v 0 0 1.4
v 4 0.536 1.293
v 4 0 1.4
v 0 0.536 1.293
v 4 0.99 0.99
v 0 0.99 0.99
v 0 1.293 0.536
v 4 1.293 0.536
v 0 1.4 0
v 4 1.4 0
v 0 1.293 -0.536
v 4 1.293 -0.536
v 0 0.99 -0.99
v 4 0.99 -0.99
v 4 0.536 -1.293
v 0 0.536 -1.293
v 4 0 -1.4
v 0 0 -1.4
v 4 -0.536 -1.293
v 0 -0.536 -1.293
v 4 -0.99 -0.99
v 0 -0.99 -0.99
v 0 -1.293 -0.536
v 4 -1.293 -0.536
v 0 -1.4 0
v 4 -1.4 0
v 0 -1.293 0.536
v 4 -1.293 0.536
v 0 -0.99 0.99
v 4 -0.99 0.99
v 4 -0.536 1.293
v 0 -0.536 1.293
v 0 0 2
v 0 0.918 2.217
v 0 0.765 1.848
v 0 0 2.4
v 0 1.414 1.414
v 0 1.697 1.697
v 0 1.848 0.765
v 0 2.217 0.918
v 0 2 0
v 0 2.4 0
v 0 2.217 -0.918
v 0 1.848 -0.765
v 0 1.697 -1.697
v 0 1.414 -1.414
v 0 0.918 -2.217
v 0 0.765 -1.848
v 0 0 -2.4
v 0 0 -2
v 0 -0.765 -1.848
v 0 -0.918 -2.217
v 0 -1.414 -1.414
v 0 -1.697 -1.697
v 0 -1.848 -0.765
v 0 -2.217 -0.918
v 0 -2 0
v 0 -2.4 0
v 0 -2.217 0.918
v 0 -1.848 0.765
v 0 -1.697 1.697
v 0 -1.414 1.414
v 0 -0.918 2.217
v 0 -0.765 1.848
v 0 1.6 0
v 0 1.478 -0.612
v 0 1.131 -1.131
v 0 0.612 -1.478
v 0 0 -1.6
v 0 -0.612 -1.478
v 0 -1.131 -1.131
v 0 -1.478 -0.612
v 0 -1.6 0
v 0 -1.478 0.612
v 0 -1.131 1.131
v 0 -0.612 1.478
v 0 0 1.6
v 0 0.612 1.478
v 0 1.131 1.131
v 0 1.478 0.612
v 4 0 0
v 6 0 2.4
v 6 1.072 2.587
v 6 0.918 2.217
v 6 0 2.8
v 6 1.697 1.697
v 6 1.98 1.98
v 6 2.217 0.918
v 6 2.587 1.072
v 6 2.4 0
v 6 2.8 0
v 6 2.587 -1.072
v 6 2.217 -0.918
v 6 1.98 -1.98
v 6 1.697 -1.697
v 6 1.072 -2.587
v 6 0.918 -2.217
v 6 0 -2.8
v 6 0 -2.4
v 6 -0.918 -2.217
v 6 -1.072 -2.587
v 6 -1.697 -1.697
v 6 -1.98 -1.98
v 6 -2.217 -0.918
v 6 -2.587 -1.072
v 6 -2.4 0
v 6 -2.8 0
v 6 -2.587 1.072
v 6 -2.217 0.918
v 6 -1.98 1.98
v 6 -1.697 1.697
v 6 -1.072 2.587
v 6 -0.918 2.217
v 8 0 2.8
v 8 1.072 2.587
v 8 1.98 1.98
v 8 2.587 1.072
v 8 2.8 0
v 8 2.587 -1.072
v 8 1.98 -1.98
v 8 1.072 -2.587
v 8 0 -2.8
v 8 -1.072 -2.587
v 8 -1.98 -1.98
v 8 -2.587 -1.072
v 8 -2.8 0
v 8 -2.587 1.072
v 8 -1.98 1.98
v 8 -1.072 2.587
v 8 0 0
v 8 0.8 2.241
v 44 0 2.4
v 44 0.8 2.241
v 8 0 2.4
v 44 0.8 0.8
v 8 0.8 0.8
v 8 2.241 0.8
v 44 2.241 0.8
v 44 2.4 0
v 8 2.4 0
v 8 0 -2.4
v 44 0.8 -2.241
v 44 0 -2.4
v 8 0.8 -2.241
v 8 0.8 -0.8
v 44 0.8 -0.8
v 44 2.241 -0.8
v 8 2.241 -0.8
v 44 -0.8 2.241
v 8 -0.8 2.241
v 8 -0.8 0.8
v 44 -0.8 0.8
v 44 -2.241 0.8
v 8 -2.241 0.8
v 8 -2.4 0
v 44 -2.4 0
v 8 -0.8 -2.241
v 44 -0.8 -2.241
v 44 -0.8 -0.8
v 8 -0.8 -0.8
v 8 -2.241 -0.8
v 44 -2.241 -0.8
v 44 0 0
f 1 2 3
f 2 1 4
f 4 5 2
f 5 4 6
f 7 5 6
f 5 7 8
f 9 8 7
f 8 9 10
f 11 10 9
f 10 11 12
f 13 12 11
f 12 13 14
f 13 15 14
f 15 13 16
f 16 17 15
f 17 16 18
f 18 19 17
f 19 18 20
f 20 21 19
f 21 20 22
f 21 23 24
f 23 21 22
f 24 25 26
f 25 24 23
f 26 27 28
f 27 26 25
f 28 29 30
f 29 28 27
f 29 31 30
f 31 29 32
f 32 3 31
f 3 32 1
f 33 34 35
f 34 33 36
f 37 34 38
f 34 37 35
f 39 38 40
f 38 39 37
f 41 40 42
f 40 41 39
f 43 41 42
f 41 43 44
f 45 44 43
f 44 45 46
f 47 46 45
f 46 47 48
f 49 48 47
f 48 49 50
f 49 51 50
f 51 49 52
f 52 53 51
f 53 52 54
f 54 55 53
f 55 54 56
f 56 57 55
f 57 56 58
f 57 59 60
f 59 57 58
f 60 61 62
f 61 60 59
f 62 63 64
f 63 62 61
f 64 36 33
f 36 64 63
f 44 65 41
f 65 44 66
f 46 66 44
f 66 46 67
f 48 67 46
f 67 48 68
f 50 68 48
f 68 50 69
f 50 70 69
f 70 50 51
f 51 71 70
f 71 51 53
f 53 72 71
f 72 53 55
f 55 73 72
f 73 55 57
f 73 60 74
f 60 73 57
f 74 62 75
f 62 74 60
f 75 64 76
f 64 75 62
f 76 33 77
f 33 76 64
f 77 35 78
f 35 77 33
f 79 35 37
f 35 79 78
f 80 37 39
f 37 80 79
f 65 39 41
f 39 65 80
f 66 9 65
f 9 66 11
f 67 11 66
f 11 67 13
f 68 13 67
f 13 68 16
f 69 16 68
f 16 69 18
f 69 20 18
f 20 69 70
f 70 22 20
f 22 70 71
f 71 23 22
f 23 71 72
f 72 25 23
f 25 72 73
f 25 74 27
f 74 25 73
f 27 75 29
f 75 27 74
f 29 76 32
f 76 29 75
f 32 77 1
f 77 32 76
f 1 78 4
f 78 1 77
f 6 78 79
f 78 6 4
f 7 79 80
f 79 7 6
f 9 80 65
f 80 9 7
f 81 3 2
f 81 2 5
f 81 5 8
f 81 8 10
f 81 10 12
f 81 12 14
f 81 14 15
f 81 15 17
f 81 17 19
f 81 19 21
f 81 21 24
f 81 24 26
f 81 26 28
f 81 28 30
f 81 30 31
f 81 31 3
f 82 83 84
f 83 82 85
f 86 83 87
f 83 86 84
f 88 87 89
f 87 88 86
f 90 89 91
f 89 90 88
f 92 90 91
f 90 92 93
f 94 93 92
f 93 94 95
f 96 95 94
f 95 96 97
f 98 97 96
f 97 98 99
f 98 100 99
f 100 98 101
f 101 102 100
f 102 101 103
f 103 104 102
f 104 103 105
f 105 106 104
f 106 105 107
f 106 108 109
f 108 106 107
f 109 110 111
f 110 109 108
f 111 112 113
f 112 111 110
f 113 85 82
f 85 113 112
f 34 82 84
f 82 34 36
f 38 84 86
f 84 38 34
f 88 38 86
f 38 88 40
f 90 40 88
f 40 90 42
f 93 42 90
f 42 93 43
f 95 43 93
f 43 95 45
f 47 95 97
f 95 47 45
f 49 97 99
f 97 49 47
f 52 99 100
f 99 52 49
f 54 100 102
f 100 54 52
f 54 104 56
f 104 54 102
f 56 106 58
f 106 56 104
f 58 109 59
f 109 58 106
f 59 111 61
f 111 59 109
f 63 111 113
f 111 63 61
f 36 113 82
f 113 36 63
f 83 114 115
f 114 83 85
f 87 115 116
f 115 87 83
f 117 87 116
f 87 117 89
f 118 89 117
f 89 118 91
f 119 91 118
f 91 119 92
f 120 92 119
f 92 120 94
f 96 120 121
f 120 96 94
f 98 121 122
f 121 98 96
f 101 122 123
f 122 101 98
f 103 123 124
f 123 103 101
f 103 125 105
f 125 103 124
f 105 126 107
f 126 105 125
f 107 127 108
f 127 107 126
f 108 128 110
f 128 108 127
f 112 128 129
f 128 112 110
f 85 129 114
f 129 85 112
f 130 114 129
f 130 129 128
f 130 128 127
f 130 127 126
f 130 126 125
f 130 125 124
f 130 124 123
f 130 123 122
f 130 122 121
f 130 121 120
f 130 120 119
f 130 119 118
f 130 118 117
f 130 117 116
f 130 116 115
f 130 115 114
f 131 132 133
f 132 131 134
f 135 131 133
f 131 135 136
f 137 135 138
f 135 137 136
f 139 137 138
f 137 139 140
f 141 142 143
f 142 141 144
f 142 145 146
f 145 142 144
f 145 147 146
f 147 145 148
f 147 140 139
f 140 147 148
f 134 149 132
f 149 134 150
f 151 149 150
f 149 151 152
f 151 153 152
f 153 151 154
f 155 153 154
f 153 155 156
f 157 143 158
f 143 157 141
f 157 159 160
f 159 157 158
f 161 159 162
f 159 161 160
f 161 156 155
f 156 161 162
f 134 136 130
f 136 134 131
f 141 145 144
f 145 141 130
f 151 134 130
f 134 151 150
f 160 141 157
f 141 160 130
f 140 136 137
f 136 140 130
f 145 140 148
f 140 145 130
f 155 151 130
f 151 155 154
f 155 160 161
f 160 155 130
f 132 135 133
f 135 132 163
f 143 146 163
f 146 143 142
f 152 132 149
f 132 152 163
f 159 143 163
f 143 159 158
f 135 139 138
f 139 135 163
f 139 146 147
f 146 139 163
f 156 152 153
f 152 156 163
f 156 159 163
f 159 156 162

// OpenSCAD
// file: ../p/axle.scad
use <../lib.scad>
function ldraw_lib__axle() = [
// 0 Axle
// 0 Name: axle.dat
// 0 Author: James Jessiman
// 0 !LDRAW_ORG Primitive UPDATE 2003-01
// 0 !LICENSE Licensed under CC BY 2.0 and CC BY 4.0 : see CAreadme.txt
// 
// 0 BFC CERTIFY CCW
  [0,"BFC","CERTIFY"],
  [0,"BFC","CCW"],
// 
// 0 !HISTORY 2000-04-23 [sbliss] Added conditional edges along outermost diameters
// 0 !HISTORY 2000-05-07 [PTadmin] Official Update 2000-01
// 0 !HISTORY 2002-11-08 [OrionP] Adjusted fit and precision
// 0 !HISTORY 2003-03-12 [PTadmin] Official Update 2003-01
// 0 !HISTORY 2007-06-24 [PTadmin] Header formatted for Contributor Agreement
// 0 !HISTORY 2008-07-01 [PTadmin] Official Update 2008-01
// 
// 
// 5 24 6 0 0 6 1 0 5.602 0 2 5.602 0 -2
  [5,24,6,0,0,6,1,0,5.602,0,2,5.602,0,-2],
// 5 24 0 0 6 0 1 6 2 0 5.602 -2 0 5.602
  [5,24,0,0,6,0,1,6,2,0,5.602,-2,0,5.602],
// 5 24 -6 0 0 -6 1 0 -5.602 0 -2 -5.602 0 2
  [5,24,-6,0,0,-6,1,0,-5.602,0,-2,-5.602,0,2],
// 5 24 0 0 -6 0 1 -6 -2 0 -5.602 2 0 -5.602
  [5,24,0,0,-6,0,1,-6,-2,0,-5.602,2,0,-5.602],
// 
// 2 24 6 0 0 5.602 0 2
  [2,24,6,0,0,5.602,0,2],
// 2 24 5.602 0 2 2 0 2
  [2,24,5.602,0,2,2,0,2],
// 2 24 2 0 2 2 0 5.602
  [2,24,2,0,2,2,0,5.602],
// 2 24 2 0 5.602 0 0 6
  [2,24,2,0,5.602,0,0,6],
// 2 24 -6 0 0 -5.602 0 2
  [2,24,-6,0,0,-5.602,0,2],
// 2 24 -5.602 0 2 -2 0 2
  [2,24,-5.602,0,2,-2,0,2],
// 2 24 -2 0 2 -2 0 5.602
  [2,24,-2,0,2,-2,0,5.602],
// 2 24 -2 0 5.602 -0 0 6
  [2,24,-2,0,5.602,-0,0,6],
// 2 24 6 0 -0 5.602 0 -2
  [2,24,6,0,-0,5.602,0,-2],
// 2 24 5.602 0 -2 2 0 -2
  [2,24,5.602,0,-2,2,0,-2],
// 2 24 2 0 -2 2 0 -5.602
  [2,24,2,0,-2,2,0,-5.602],
// 2 24 2 0 -5.602 0 0 -6
  [2,24,2,0,-5.602,0,0,-6],
// 2 24 -6 0 -0 -5.602 0 -2
  [2,24,-6,0,-0,-5.602,0,-2],
// 2 24 -5.602 0 -2 -2 0 -2
  [2,24,-5.602,0,-2,-2,0,-2],
// 2 24 -2 0 -2 -2 0 -5.602
  [2,24,-2,0,-2,-2,0,-5.602],
// 2 24 -2 0 -5.602 -0 0 -6
  [2,24,-2,0,-5.602,-0,0,-6],
// 2 24 6 1 0 5.602 1 2
  [2,24,6,1,0,5.602,1,2],
// 2 24 5.602 1 2 2 1 2
  [2,24,5.602,1,2,2,1,2],
// 2 24 2 1 2 2 1 5.602
  [2,24,2,1,2,2,1,5.602],
// 2 24 2 1 5.602 0 1 6
  [2,24,2,1,5.602,0,1,6],
// 2 24 -6 1 0 -5.602 1 2
  [2,24,-6,1,0,-5.602,1,2],
// 2 24 -5.602 1 2 -2 1 2
  [2,24,-5.602,1,2,-2,1,2],
// 2 24 -2 1 2 -2 1 5.602
  [2,24,-2,1,2,-2,1,5.602],
// 2 24 -2 1 5.602 -0 1 6
  [2,24,-2,1,5.602,-0,1,6],
// 2 24 6 1 -0 5.602 1 -2
  [2,24,6,1,-0,5.602,1,-2],
// 2 24 5.602 1 -2 2 1 -2
  [2,24,5.602,1,-2,2,1,-2],
// 2 24 2 1 -2 2 1 -5.602
  [2,24,2,1,-2,2,1,-5.602],
// 2 24 2 1 -5.602 0 1 -6
  [2,24,2,1,-5.602,0,1,-6],
// 2 24 -6 1 -0 -5.602 1 -2
  [2,24,-6,1,-0,-5.602,1,-2],
// 2 24 -5.602 1 -2 -2 1 -2
  [2,24,-5.602,1,-2,-2,1,-2],
// 2 24 -2 1 -2 -2 1 -5.602
  [2,24,-2,1,-2,-2,1,-5.602],
// 2 24 -2 1 -5.602 -0 1 -6
  [2,24,-2,1,-5.602,-0,1,-6],
// 
// 2 24 5.602 0 2 5.602 1 2
  [2,24,5.602,0,2,5.602,1,2],
// 2 24 2 0 2 2 1 2
  [2,24,2,0,2,2,1,2],
// 2 24 2 0 5.602 2 1 5.602
  [2,24,2,0,5.602,2,1,5.602],
// 2 24 -5.602 0 2 -5.602 1 2
  [2,24,-5.602,0,2,-5.602,1,2],
// 2 24 -2 0 2 -2 1 2
  [2,24,-2,0,2,-2,1,2],
// 2 24 -2 0 5.602 -2 1 5.602
  [2,24,-2,0,5.602,-2,1,5.602],
// 2 24 5.602 0 -2 5.602 1 -2
  [2,24,5.602,0,-2,5.602,1,-2],
// 2 24 2 0 -2 2 1 -2
  [2,24,2,0,-2,2,1,-2],
// 2 24 2 0 -5.602 2 1 -5.602
  [2,24,2,0,-5.602,2,1,-5.602],
// 2 24 -5.602 0 -2 -5.602 1 -2
  [2,24,-5.602,0,-2,-5.602,1,-2],
// 2 24 -2 0 -2 -2 1 -2
  [2,24,-2,0,-2,-2,1,-2],
// 2 24 -2 0 -5.602 -2 1 -5.602
  [2,24,-2,0,-5.602,-2,1,-5.602],
// 
// 4 16 6 0 0 6 1 0 5.602 1 2 5.602 0 2
  [4,16,6,0,0,6,1,0,5.602,1,2,5.602,0,2],
// 4 16 5.602 0 2 5.602 1 2 2 1 2 2 0 2
  [4,16,5.602,0,2,5.602,1,2,2,1,2,2,0,2],
// 4 16 2 0 2 2 1 2 2 1 5.602 2 0 5.602
  [4,16,2,0,2,2,1,2,2,1,5.602,2,0,5.602],
// 4 16 2 0 5.602 2 1 5.602 0 1 6 0 0 6
  [4,16,2,0,5.602,2,1,5.602,0,1,6,0,0,6],
// 4 16 -6 0 0 -5.602 0 2 -5.602 1 2 -6 1 0
  [4,16,-6,0,0,-5.602,0,2,-5.602,1,2,-6,1,0],
// 4 16 -5.602 0 2 -2 0 2 -2 1 2 -5.602 1 2
  [4,16,-5.602,0,2,-2,0,2,-2,1,2,-5.602,1,2],
// 4 16 -2 0 2 -2 0 5.602 -2 1 5.602 -2 1 2
  [4,16,-2,0,2,-2,0,5.602,-2,1,5.602,-2,1,2],
// 4 16 -2 0 5.602 -0 0 6 -0 1 6 -2 1 5.602
  [4,16,-2,0,5.602,-0,0,6,-0,1,6,-2,1,5.602],
// 4 16 6 0 -0 5.602 0 -2 5.602 1 -2 6 1 -0
  [4,16,6,0,-0,5.602,0,-2,5.602,1,-2,6,1,-0],
// 4 16 5.602 0 -2 2 0 -2 2 1 -2 5.602 1 -2
  [4,16,5.602,0,-2,2,0,-2,2,1,-2,5.602,1,-2],
// 4 16 2 0 -2 2 0 -5.602 2 1 -5.602 2 1 -2
  [4,16,2,0,-2,2,0,-5.602,2,1,-5.602,2,1,-2],
// 4 16 2 0 -5.602 0 0 -6 0 1 -6 2 1 -5.602
  [4,16,2,0,-5.602,0,0,-6,0,1,-6,2,1,-5.602],
// 4 16 -6 0 -0 -6 1 -0 -5.602 1 -2 -5.602 0 -2
  [4,16,-6,0,-0,-6,1,-0,-5.602,1,-2,-5.602,0,-2],
// 4 16 -5.602 0 -2 -5.602 1 -2 -2 1 -2 -2 0 -2
  [4,16,-5.602,0,-2,-5.602,1,-2,-2,1,-2,-2,0,-2],
// 4 16 -2 0 -2 -2 1 -2 -2 1 -5.602 -2 0 -5.602
  [4,16,-2,0,-2,-2,1,-2,-2,1,-5.602,-2,0,-5.602],
// 4 16 -2 0 -5.602 -2 1 -5.602 -0 1 -6 -0 0 -6
  [4,16,-2,0,-5.602,-2,1,-5.602,-0,1,-6,-0,0,-6],
// 
// 4 16 6 0 0 5.602 0 2 2 0 2 0 0 0
  [4,16,6,0,0,5.602,0,2,2,0,2,0,0,0],
// 4 16 -6 0 0 0 0 0 -2 0 2 -5.602 0 2
  [4,16,-6,0,0,0,0,0,-2,0,2,-5.602,0,2],
// 4 16 6 0 0 0 0 0 2 0 -2 5.602 0 -2
  [4,16,6,0,0,0,0,0,2,0,-2,5.602,0,-2],
// 4 16 -6 0 0 -5.602 0 -2 -2 0 -2 0 0 0
  [4,16,-6,0,0,-5.602,0,-2,-2,0,-2,0,0,0],
// 4 16 0 0 6 0 0 0 2 0 2 2 0 5.602
  [4,16,0,0,6,0,0,0,2,0,2,2,0,5.602],
// 4 16 0 0 6 -2 0 5.602 -2 0 2 0 0 0
  [4,16,0,0,6,-2,0,5.602,-2,0,2,0,0,0],
// 4 16 0 0 -6 2 0 -5.602 2 0 -2 0 0 0
  [4,16,0,0,-6,2,0,-5.602,2,0,-2,0,0,0],
// 4 16 0 0 -6 0 0 0 -2 0 -2 -2 0 -5.602
  [4,16,0,0,-6,0,0,0,-2,0,-2,-2,0,-5.602],
// 4 16 6 1 0 0 1 0 2 1 2 5.602 1 2
  [4,16,6,1,0,0,1,0,2,1,2,5.602,1,2],
// 4 16 -6 1 0 -5.602 1 2 -2 1 2 0 1 0
  [4,16,-6,1,0,-5.602,1,2,-2,1,2,0,1,0],
// 4 16 6 1 0 5.602 1 -2 2 1 -2 0 1 0
  [4,16,6,1,0,5.602,1,-2,2,1,-2,0,1,0],
// 4 16 -6 1 0 0 1 0 -2 1 -2 -5.602 1 -2
  [4,16,-6,1,0,0,1,0,-2,1,-2,-5.602,1,-2],
// 4 16 0 1 6 2 1 5.602 2 1 2 0 1 0
  [4,16,0,1,6,2,1,5.602,2,1,2,0,1,0],
// 4 16 0 1 6 0 1 0 -2 1 2 -2 1 5.602
  [4,16,0,1,6,0,1,0,-2,1,2,-2,1,5.602],
// 4 16 0 1 -6 0 1 0 2 1 -2 2 1 -5.602
  [4,16,0,1,-6,0,1,0,2,1,-2,2,1,-5.602],
// 4 16 0 1 -6 -2 1 -5.602 -2 1 -2 0 1 0
  [4,16,0,1,-6,-2,1,-5.602,-2,1,-2,0,1,0],
// 0
];
module ldraw_lib__axle(step=0, col=false, unit=2/5, alt=false, line=0.2, solid=!$preview)
    makepoly(ldraw_lib__axle(), step=step, col=col, unit=unit, alt=alt, line=line, solid=solid);
ldraw_lib__axle(line=0.2);
// file: ../p/4-4ring7.scad
use <../lib.scad>
function ldraw_lib__4_4ring7() = [
// 0 Ring  7 x 1.0
// 0 Name: 4-4ring7.dat
// 0 Author: James Jessiman
// 0 !LDRAW_ORG Primitive UPDATE 2009-01
// 0 !LICENSE Licensed under CC BY 2.0 and CC BY 4.0 : see CAreadme.txt
// 
// 0 BFC CERTIFY CCW
  [0,"BFC","CERTIFY"],
  [0,"BFC","CCW"],
// 
// 0 !HISTORY 1998-12-15 [PTadmin] Official Update 1998-10
// 0 !HISTORY 2002-04-05 [hafhead] Added BFC statement
// 0 !HISTORY 2002-04-25 [PTadmin] Official Update 2002-02
// 0 !HISTORY 2007-06-24 [PTadmin] Header formatted for Contributor Agreement
// 0 !HISTORY 2008-07-01 [PTadmin] Official Update 2008-01
// 0 !HISTORY 2008-08-26 [cwdee] Switch polygon winding and rename
// 0 !HISTORY 2009-05-02 [PTadmin] Official Update 2009-01
// 
// 
// 4 16 -3.0616 0 7.3912 -2.6789 0 6.4673 0 0 7 0 0 8
  [4,16,-3.0616,0,7.3912,-2.6789,0,6.4673,0,0,7,0,0,8],
// 4 16 -5.6568 0 5.6568 -4.9497 0 4.9497 -2.6789 0 6.4673 -3.0616 0 7.3912
  [4,16,-5.6568,0,5.6568,-4.9497,0,4.9497,-2.6789,0,6.4673,-3.0616,0,7.3912],
// 4 16 -7.3912 0 3.0616 -6.4673 0 2.6789 -4.9497 0 4.9497 -5.6568 0 5.6568
  [4,16,-7.3912,0,3.0616,-6.4673,0,2.6789,-4.9497,0,4.9497,-5.6568,0,5.6568],
// 4 16 -8 0 0 -7 0 0 -6.4673 0 2.6789 -7.3912 0 3.0616
  [4,16,-8,0,0,-7,0,0,-6.4673,0,2.6789,-7.3912,0,3.0616],
// 4 16 -7.3912 0 -3.0616 -6.4673 0 -2.6789 -7 0 0 -8 0 0
  [4,16,-7.3912,0,-3.0616,-6.4673,0,-2.6789,-7,0,0,-8,0,0],
// 4 16 -5.6568 0 -5.6568 -4.9497 0 -4.9497 -6.4673 0 -2.6789 -7.3912 0 -3.0616
  [4,16,-5.6568,0,-5.6568,-4.9497,0,-4.9497,-6.4673,0,-2.6789,-7.3912,0,-3.0616],
// 4 16 -3.0616 0 -7.3912 -2.6789 0 -6.4673 -4.9497 0 -4.9497 -5.6568 0 -5.6568
  [4,16,-3.0616,0,-7.3912,-2.6789,0,-6.4673,-4.9497,0,-4.9497,-5.6568,0,-5.6568],
// 4 16 0 0 -8 0 0 -7 -2.6789 0 -6.4673 -3.0616 0 -7.3912
  [4,16,0,0,-8,0,0,-7,-2.6789,0,-6.4673,-3.0616,0,-7.3912],
// 4 16 3.0616 0 -7.3912 2.6789 0 -6.4673 0 0 -7 0 0 -8
  [4,16,3.0616,0,-7.3912,2.6789,0,-6.4673,0,0,-7,0,0,-8],
// 4 16 5.6568 0 -5.6568 4.9497 0 -4.9497 2.6789 0 -6.4673 3.0616 0 -7.3912
  [4,16,5.6568,0,-5.6568,4.9497,0,-4.9497,2.6789,0,-6.4673,3.0616,0,-7.3912],
// 4 16 7.3912 0 -3.0616 6.4673 0 -2.6789 4.9497 0 -4.9497 5.6568 0 -5.6568
  [4,16,7.3912,0,-3.0616,6.4673,0,-2.6789,4.9497,0,-4.9497,5.6568,0,-5.6568],
// 4 16 8 0 0 7 0 0 6.4673 0 -2.6789 7.3912 0 -3.0616
  [4,16,8,0,0,7,0,0,6.4673,0,-2.6789,7.3912,0,-3.0616],
// 4 16 7.3912 0 3.0616 6.4673 0 2.6789 7 0 0 8 0 0
  [4,16,7.3912,0,3.0616,6.4673,0,2.6789,7,0,0,8,0,0],
// 4 16 5.6568 0 5.6568 4.9497 0 4.9497 6.4673 0 2.6789 7.3912 0 3.0616
  [4,16,5.6568,0,5.6568,4.9497,0,4.9497,6.4673,0,2.6789,7.3912,0,3.0616],
// 4 16 3.0616 0 7.3912 2.6789 0 6.4673 4.9497 0 4.9497 5.6568 0 5.6568
  [4,16,3.0616,0,7.3912,2.6789,0,6.4673,4.9497,0,4.9497,5.6568,0,5.6568],
// 4 16 0 0 8 0 0 7 2.6789 0 6.4673 3.0616 0 7.3912
  [4,16,0,0,8,0,0,7,2.6789,0,6.4673,3.0616,0,7.3912],
// 0
];
module ldraw_lib__4_4ring7(step=0, col=false, unit=2/5, alt=false, line=0.2, solid=!$preview)
    makepoly(ldraw_lib__4_4ring7(), step=step, col=col, unit=unit, alt=alt, line=line, solid=solid);
ldraw_lib__4_4ring7(line=0.2);
// file: ../p/4-4ring6.scad
use <../lib.scad>
function ldraw_lib__4_4ring6() = [
// 0 Ring  6 x 1.0
// 0 Name: 4-4ring6.dat
// 0 Author: Mark Kennedy [mkennedy]
// 0 !LDRAW_ORG Primitive UPDATE 2012-01
// 0 !LICENSE Licensed under CC BY 2.0 and CC BY 4.0 : see CAreadme.txt
// 
// 0 BFC CERTIFY CCW
  [0,"BFC","CERTIFY"],
  [0,"BFC","CCW"],
// 
// 0 !HISTORY 2001-10-23 [pneaster] resequenced quads, corrected winding.
// 0 !HISTORY 2001-11-30 [PTadmin] Official Update 2001-02
// 0 !HISTORY 2007-06-24 [PTadmin] Header formatted for Contributor Agreement
// 0 !HISTORY 2008-07-01 [PTadmin] Official Update 2008-01
// 0 !HISTORY 2012-02-16 [Philo] Changed to CCW
// 0 !HISTORY 2012-03-30 [PTadmin] Official Update 2012-01
// 
// 
// 4 16 7 0 0 6.4672 0 2.6788 5.5433 0 2.2961 6 0 0
  [4,16,7,0,0,6.4672,0,2.6788,5.5433,0,2.2961,6,0,0],
// 4 16 6.4672 0 2.6788 4.9497 0 4.9497 4.2426 0 4.2426 5.5433 0 2.2961
  [4,16,6.4672,0,2.6788,4.9497,0,4.9497,4.2426,0,4.2426,5.5433,0,2.2961],
// 4 16 4.9497 0 4.9497 2.6788 0 6.4672 2.2961 0 5.5433 4.2426 0 4.2426
  [4,16,4.9497,0,4.9497,2.6788,0,6.4672,2.2961,0,5.5433,4.2426,0,4.2426],
// 4 16 2.6788 0 6.4672 0 0 7 0 0 6 2.2961 0 5.5433
  [4,16,2.6788,0,6.4672,0,0,7,0,0,6,2.2961,0,5.5433],
// 4 16 0 0 7 -2.6788 0 6.4672 -2.2961 0 5.5433 0 0 6
  [4,16,0,0,7,-2.6788,0,6.4672,-2.2961,0,5.5433,0,0,6],
// 4 16 -2.6788 0 6.4672 -4.9497 0 4.9497 -4.2426 0 4.2426 -2.2961 0 5.5433
  [4,16,-2.6788,0,6.4672,-4.9497,0,4.9497,-4.2426,0,4.2426,-2.2961,0,5.5433],
// 4 16 -4.9497 0 4.9497 -6.4672 0 2.6788 -5.5433 0 2.2961 -4.2426 0 4.2426
  [4,16,-4.9497,0,4.9497,-6.4672,0,2.6788,-5.5433,0,2.2961,-4.2426,0,4.2426],
// 4 16 -6.4672 0 2.6788 -7 0 0 -6 0 0 -5.5433 0 2.2961
  [4,16,-6.4672,0,2.6788,-7,0,0,-6,0,0,-5.5433,0,2.2961],
// 4 16 -7 0 0 -6.4672 0 -2.6788 -5.5433 0 -2.2961 -6 0 0
  [4,16,-7,0,0,-6.4672,0,-2.6788,-5.5433,0,-2.2961,-6,0,0],
// 4 16 -6.4672 0 -2.6788 -4.9497 0 -4.9497 -4.2426 0 -4.2426 -5.5433 0 -2.2961
  [4,16,-6.4672,0,-2.6788,-4.9497,0,-4.9497,-4.2426,0,-4.2426,-5.5433,0,-2.2961],
// 4 16 -4.9497 0 -4.9497 -2.6788 0 -6.4672 -2.2961 0 -5.5433 -4.2426 0 -4.2426
  [4,16,-4.9497,0,-4.9497,-2.6788,0,-6.4672,-2.2961,0,-5.5433,-4.2426,0,-4.2426],
// 4 16 -2.6788 0 -6.4672 0 0 -7 0 0 -6 -2.2961 0 -5.5433
  [4,16,-2.6788,0,-6.4672,0,0,-7,0,0,-6,-2.2961,0,-5.5433],
// 4 16 0 0 -7 2.6788 0 -6.4672 2.2961 0 -5.5433 0 0 -6
  [4,16,0,0,-7,2.6788,0,-6.4672,2.2961,0,-5.5433,0,0,-6],
// 4 16 2.6788 0 -6.4672 4.9497 0 -4.9497 4.2426 0 -4.2426 2.2961 0 -5.5433
  [4,16,2.6788,0,-6.4672,4.9497,0,-4.9497,4.2426,0,-4.2426,2.2961,0,-5.5433],
// 4 16 4.9497 0 -4.9497 6.4672 0 -2.6788 5.5433 0 -2.2961 4.2426 0 -4.2426
  [4,16,4.9497,0,-4.9497,6.4672,0,-2.6788,5.5433,0,-2.2961,4.2426,0,-4.2426],
// 4 16 6.4672 0 -2.6788 7 0 0 6 0 0 5.5433 0 -2.2961
  [4,16,6.4672,0,-2.6788,7,0,0,6,0,0,5.5433,0,-2.2961],
];
module ldraw_lib__4_4ring6(step=0, col=false, unit=2/5, alt=false, line=0.2, solid=!$preview)
    makepoly(ldraw_lib__4_4ring6(), step=step, col=col, unit=unit, alt=alt, line=line, solid=solid);
ldraw_lib__4_4ring6(line=0.2);
// file: ../p/4-4ring5.scad
use <../lib.scad>
function ldraw_lib__4_4ring5() = [
// 0 Ring  5 x 1.0
// 0 Name: 4-4ring5.dat
// 0 Author: Mark Kennedy [mkennedy]
// 0 !LDRAW_ORG Primitive UPDATE 2012-01
// 0 !LICENSE Licensed under CC BY 2.0 and CC BY 4.0 : see CAreadme.txt
// 
// 0 BFC CERTIFY CCW
  [0,"BFC","CERTIFY"],
  [0,"BFC","CCW"],
// 
// 0 !HISTORY 2001-10-23 [pneaster] resequenced quads, corrected winding.
// 0 !HISTORY 2001-12-29 [pneaster] Added BFC.
// 0 !HISTORY 2002-04-25 [PTadmin] Official Update 2002-02
// 0 !HISTORY 2007-06-24 [PTadmin] Header formatted for Contributor Agreement
// 0 !HISTORY 2008-07-01 [PTadmin] Official Update 2008-01
// 0 !HISTORY 2012-02-16 [Philo] Changed to CCW
// 0 !HISTORY 2012-03-30 [PTadmin] Official Update 2012-01
// 
// 
// 4 16 6 0 0 5.5433 0 2.2961 4.6195 0 1.9135 5 0 0
  [4,16,6,0,0,5.5433,0,2.2961,4.6195,0,1.9135,5,0,0],
// 4 16 5.5433 0 2.2961 4.2426 0 4.2426 3.5355 0 3.5355 4.6195 0 1.9135
  [4,16,5.5433,0,2.2961,4.2426,0,4.2426,3.5355,0,3.5355,4.6195,0,1.9135],
// 4 16 4.2426 0 4.2426 2.2961 0 5.5433 1.9135 0 4.6195 3.5355 0 3.5355
  [4,16,4.2426,0,4.2426,2.2961,0,5.5433,1.9135,0,4.6195,3.5355,0,3.5355],
// 4 16 2.2961 0 5.5433 0 0 6 0 0 5 1.9135 0 4.6195
  [4,16,2.2961,0,5.5433,0,0,6,0,0,5,1.9135,0,4.6195],
// 4 16 0 0 6 -2.2961 0 5.5433 -1.9135 0 4.6195 0 0 5
  [4,16,0,0,6,-2.2961,0,5.5433,-1.9135,0,4.6195,0,0,5],
// 4 16 -2.2961 0 5.5433 -4.2426 0 4.2426 -3.5355 0 3.5355 -1.9135 0 4.6195
  [4,16,-2.2961,0,5.5433,-4.2426,0,4.2426,-3.5355,0,3.5355,-1.9135,0,4.6195],
// 4 16 -4.2426 0 4.2426 -5.5433 0 2.2961 -4.6195 0 1.9135 -3.5355 0 3.5355
  [4,16,-4.2426,0,4.2426,-5.5433,0,2.2961,-4.6195,0,1.9135,-3.5355,0,3.5355],
// 4 16 -5.5433 0 2.2961 -6 0 0 -5 0 0 -4.6195 0 1.9135
  [4,16,-5.5433,0,2.2961,-6,0,0,-5,0,0,-4.6195,0,1.9135],
// 4 16 -6 0 0 -5.5433 0 -2.2961 -4.6195 0 -1.9135 -5 0 0
  [4,16,-6,0,0,-5.5433,0,-2.2961,-4.6195,0,-1.9135,-5,0,0],
// 4 16 -5.5433 0 -2.2961 -4.2426 0 -4.2426 -3.5355 0 -3.5355 -4.6195 0 -1.9135
  [4,16,-5.5433,0,-2.2961,-4.2426,0,-4.2426,-3.5355,0,-3.5355,-4.6195,0,-1.9135],
// 4 16 -4.2426 0 -4.2426 -2.2961 0 -5.5433 -1.9135 0 -4.6195 -3.5355 0 -3.5355
  [4,16,-4.2426,0,-4.2426,-2.2961,0,-5.5433,-1.9135,0,-4.6195,-3.5355,0,-3.5355],
// 4 16 -2.2961 0 -5.5433 0 0 -6 0 0 -5 -1.9135 0 -4.6195
  [4,16,-2.2961,0,-5.5433,0,0,-6,0,0,-5,-1.9135,0,-4.6195],
// 4 16 0 0 -6 2.2961 0 -5.5433 1.9135 0 -4.6195 0 0 -5
  [4,16,0,0,-6,2.2961,0,-5.5433,1.9135,0,-4.6195,0,0,-5],
// 4 16 2.2961 0 -5.5433 4.2426 0 -4.2426 3.5355 0 -3.5355 1.9135 0 -4.6195
  [4,16,2.2961,0,-5.5433,4.2426,0,-4.2426,3.5355,0,-3.5355,1.9135,0,-4.6195],
// 4 16 4.2426 0 -4.2426 5.5433 0 -2.2961 4.6195 0 -1.9135 3.5355 0 -3.5355
  [4,16,4.2426,0,-4.2426,5.5433,0,-2.2961,4.6195,0,-1.9135,3.5355,0,-3.5355],
// 4 16 5.5433 0 -2.2961 6 0 0 5 0 0 4.6195 0 -1.9135
  [4,16,5.5433,0,-2.2961,6,0,0,5,0,0,4.6195,0,-1.9135],
];
module ldraw_lib__4_4ring5(step=0, col=false, unit=2/5, alt=false, line=0.2, solid=!$preview)
    makepoly(ldraw_lib__4_4ring5(), step=step, col=col, unit=unit, alt=alt, line=line, solid=solid);
ldraw_lib__4_4ring5(line=0.2);
// file: ../p/4-4ring4.scad
use <../lib.scad>
function ldraw_lib__4_4ring4() = [
// 0 Ring  4 x 1.0
// 0 Name: 4-4ring4.dat
// 0 Author: James Jessiman
// 0 !LDRAW_ORG Primitive UPDATE 2009-01
// 0 !LICENSE Licensed under CC BY 2.0 and CC BY 4.0 : see CAreadme.txt
// 
// 0 BFC CERTIFY CCW
  [0,"BFC","CERTIFY"],
  [0,"BFC","CCW"],
// 
// 0 !HISTORY 1998-12-15 [PTadmin] Official Update 1998-10
// 0 !HISTORY 2002-04-08 [BrickCaster] Modified for BFC compliance
// 0 !HISTORY 2002-04-25 [PTadmin] Official Update 2002-02
// 0 !HISTORY 2007-06-24 [PTadmin] Header formatted for Contributor Agreement
// 0 !HISTORY 2008-07-01 [PTadmin] Official Update 2008-01
// 0 !HISTORY 2008-08-26 [cwdee] Switch polygon winding and rename
// 0 !HISTORY 2009-05-02 [PTadmin] Official Update 2009-01
// 
// 
// 4 16 -1.9135 0 4.6195 -1.5308 0 3.6956 0 0 4 0 0 5
  [4,16,-1.9135,0,4.6195,-1.5308,0,3.6956,0,0,4,0,0,5],
// 4 16 -3.5355 0 3.5355 -2.8284 0 2.8284 -1.5308 0 3.6956 -1.9135 0 4.6195
  [4,16,-3.5355,0,3.5355,-2.8284,0,2.8284,-1.5308,0,3.6956,-1.9135,0,4.6195],
// 4 16 -4.6195 0 1.9135 -3.6956 0 1.5308 -2.8284 0 2.8284 -3.5355 0 3.5355
  [4,16,-4.6195,0,1.9135,-3.6956,0,1.5308,-2.8284,0,2.8284,-3.5355,0,3.5355],
// 4 16 -5 0 0 -4 0 0 -3.6956 0 1.5308 -4.6195 0 1.9135
  [4,16,-5,0,0,-4,0,0,-3.6956,0,1.5308,-4.6195,0,1.9135],
// 4 16 -4.6195 0 -1.9135 -3.6956 0 -1.5308 -4 0 0 -5 0 0
  [4,16,-4.6195,0,-1.9135,-3.6956,0,-1.5308,-4,0,0,-5,0,0],
// 4 16 -3.5355 0 -3.5355 -2.8284 0 -2.8284 -3.6956 0 -1.5308 -4.6195 0 -1.9135
  [4,16,-3.5355,0,-3.5355,-2.8284,0,-2.8284,-3.6956,0,-1.5308,-4.6195,0,-1.9135],
// 4 16 -1.9135 0 -4.6195 -1.5308 0 -3.6956 -2.8284 0 -2.8284 -3.5355 0 -3.5355
  [4,16,-1.9135,0,-4.6195,-1.5308,0,-3.6956,-2.8284,0,-2.8284,-3.5355,0,-3.5355],
// 4 16 0 0 -5 0 0 -4 -1.5308 0 -3.6956 -1.9135 0 -4.6195
  [4,16,0,0,-5,0,0,-4,-1.5308,0,-3.6956,-1.9135,0,-4.6195],
// 4 16 1.9135 0 -4.6195 1.5308 0 -3.6956 0 0 -4 0 0 -5
  [4,16,1.9135,0,-4.6195,1.5308,0,-3.6956,0,0,-4,0,0,-5],
// 4 16 3.5355 0 -3.5355 2.8284 0 -2.8284 1.5308 0 -3.6956 1.9135 0 -4.6195
  [4,16,3.5355,0,-3.5355,2.8284,0,-2.8284,1.5308,0,-3.6956,1.9135,0,-4.6195],
// 4 16 4.6195 0 -1.9135 3.6956 0 -1.5308 2.8284 0 -2.8284 3.5355 0 -3.5355
  [4,16,4.6195,0,-1.9135,3.6956,0,-1.5308,2.8284,0,-2.8284,3.5355,0,-3.5355],
// 4 16 5 0 0 4 0 0 3.6956 0 -1.5308 4.6195 0 -1.9135
  [4,16,5,0,0,4,0,0,3.6956,0,-1.5308,4.6195,0,-1.9135],
// 4 16 4.6195 0 1.9135 3.6956 0 1.5308 4 0 0 5 0 0
  [4,16,4.6195,0,1.9135,3.6956,0,1.5308,4,0,0,5,0,0],
// 4 16 3.5355 0 3.5355 2.8284 0 2.8284 3.6956 0 1.5308 4.6195 0 1.9135
  [4,16,3.5355,0,3.5355,2.8284,0,2.8284,3.6956,0,1.5308,4.6195,0,1.9135],
// 4 16 1.9135 0 4.6195 1.5308 0 3.6956 2.8284 0 2.8284 3.5355 0 3.5355
  [4,16,1.9135,0,4.6195,1.5308,0,3.6956,2.8284,0,2.8284,3.5355,0,3.5355],
// 4 16 0 0 5 0 0 4 1.5308 0 3.6956 1.9135 0 4.6195
  [4,16,0,0,5,0,0,4,1.5308,0,3.6956,1.9135,0,4.6195],
// 0
];
module ldraw_lib__4_4ring4(step=0, col=false, unit=2/5, alt=false, line=0.2, solid=!$preview)
    makepoly(ldraw_lib__4_4ring4(), step=step, col=col, unit=unit, alt=alt, line=line, solid=solid);
ldraw_lib__4_4ring4(line=0.2);
// file: ../p/4-4edge.scad
use <../lib.scad>
function ldraw_lib__4_4edge() = [
// 0 Circle 1.0
// 0 Name: 4-4edge.dat
// 0 Author: James Jessiman
// 0 !LDRAW_ORG Primitive UPDATE 2017-01
// 0 !LICENSE Licensed under CC BY 2.0 and CC BY 4.0 : see CAreadme.txt
// 
// 0 BFC CERTIFY CCW
  [0,"BFC","CERTIFY"],
  [0,"BFC","CCW"],
// 
// 0 !HISTORY 1998-12-15 [PTadmin] Official Update 1998-10
// 0 !HISTORY 2005-12-28 [PTadmin] Official Update 2005-01
// 0 !HISTORY 2007-06-24 [PTadmin] Header formatted for Contributor Agreement
// 0 !HISTORY 2008-07-01 [PTadmin] Official Update 2008-01
// 0 !HISTORY 2017-01-15 [Steffen] BFCed
// 0 !HISTORY 2017-12-30 [PTadmin] Official Update 2017-01
// 
// 
// 2 24 1 0 0 0.9239 0 0.3827
  [2,24,1,0,0,0.9239,0,0.3827],
// 2 24 0.9239 0 0.3827 0.7071 0 0.7071
  [2,24,0.9239,0,0.3827,0.7071,0,0.7071],
// 2 24 0.7071 0 0.7071 0.3827 0 0.9239
  [2,24,0.7071,0,0.7071,0.3827,0,0.9239],
// 2 24 0.3827 0 0.9239 0 0 1
  [2,24,0.3827,0,0.9239,0,0,1],
// 2 24 0 0 1 -0.3827 0 0.9239
  [2,24,0,0,1,-0.3827,0,0.9239],
// 2 24 -0.3827 0 0.9239 -0.7071 0 0.7071
  [2,24,-0.3827,0,0.9239,-0.7071,0,0.7071],
// 2 24 -0.7071 0 0.7071 -0.9239 0 0.3827
  [2,24,-0.7071,0,0.7071,-0.9239,0,0.3827],
// 2 24 -0.9239 0 0.3827 -1 0 -0
  [2,24,-0.9239,0,0.3827,-1,0,-0],
// 2 24 -1 0 -0 -0.9239 0 -0.3827
  [2,24,-1,0,-0,-0.9239,0,-0.3827],
// 2 24 -0.9239 0 -0.3827 -0.7071 0 -0.7071
  [2,24,-0.9239,0,-0.3827,-0.7071,0,-0.7071],
// 2 24 -0.7071 0 -0.7071 -0.3827 0 -0.9239
  [2,24,-0.7071,0,-0.7071,-0.3827,0,-0.9239],
// 2 24 -0.3827 0 -0.9239 0 0 -1
  [2,24,-0.3827,0,-0.9239,0,0,-1],
// 2 24 0 0 -1 0.3827 0 -0.9239
  [2,24,0,0,-1,0.3827,0,-0.9239],
// 2 24 0.3827 0 -0.9239 0.7071 0 -0.7071
  [2,24,0.3827,0,-0.9239,0.7071,0,-0.7071],
// 2 24 0.7071 0 -0.7071 0.9239 0 -0.3827
  [2,24,0.7071,0,-0.7071,0.9239,0,-0.3827],
// 2 24 0.9239 0 -0.3827 1 0 0
  [2,24,0.9239,0,-0.3827,1,0,0],
];
module ldraw_lib__4_4edge(step=0, col=false, unit=2/5, alt=false, line=0.2, solid=!$preview)
    makepoly(ldraw_lib__4_4edge(), step=step, col=col, unit=unit, alt=alt, line=line, solid=solid);
ldraw_lib__4_4edge(line=0.2);
// file: ../p/4-4disc.scad
use <../lib.scad>
function ldraw_lib__4_4disc() = [
// 0 Disc 1.0
// 0 Name: 4-4disc.dat
// 0 Author: James Jessiman
// 0 !LDRAW_ORG Primitive UPDATE 2002-02
// 0 !LICENSE Licensed under CC BY 2.0 and CC BY 4.0 : see CAreadme.txt
// 
// 0 BFC CERTIFY CCW
  [0,"BFC","CERTIFY"],
  [0,"BFC","CCW"],
// 
// 0 !HISTORY 1998-12-15 [PTadmin] Official Update 1998-10
// 0 !HISTORY 2002-03-23 [sbliss] Added BFC statement
// 0 !HISTORY 2002-04-25 [PTadmin] Official Update 2002-02
// 0 !HISTORY 2007-06-24 [PTadmin] Header formatted for Contributor Agreement
// 0 !HISTORY 2008-07-01 [PTadmin] Official Update 2008-01
// 
// 
// 3 16 0 0 0 1 0 0 0.9239 0 0.3827
  [3,16,0,0,0,1,0,0,0.9239,0,0.3827],
// 3 16 0 0 0 0.9239 0 0.3827 0.7071 0 0.7071
  [3,16,0,0,0,0.9239,0,0.3827,0.7071,0,0.7071],
// 3 16 0 0 0 0.7071 0 0.7071 0.3827 0 0.9239
  [3,16,0,0,0,0.7071,0,0.7071,0.3827,0,0.9239],
// 3 16 0 0 0 0.3827 0 0.9239 0 0 1
  [3,16,0,0,0,0.3827,0,0.9239,0,0,1],
// 3 16 0 0 0 0 0 1 -0.3827 0 0.9239
  [3,16,0,0,0,0,0,1,-0.3827,0,0.9239],
// 3 16 0 0 0 -0.3827 0 0.9239 -0.7071 0 0.7071
  [3,16,0,0,0,-0.3827,0,0.9239,-0.7071,0,0.7071],
// 3 16 0 0 0 -0.7071 0 0.7071 -0.9239 0 0.3827
  [3,16,0,0,0,-0.7071,0,0.7071,-0.9239,0,0.3827],
// 3 16 0 0 0 -0.9239 0 0.3827 -1 0 -0
  [3,16,0,0,0,-0.9239,0,0.3827,-1,0,-0],
// 3 16 0 0 0 -1 0 -0 -0.9239 0 -0.3827
  [3,16,0,0,0,-1,0,-0,-0.9239,0,-0.3827],
// 3 16 0 0 0 -0.9239 0 -0.3827 -0.7071 0 -0.7071
  [3,16,0,0,0,-0.9239,0,-0.3827,-0.7071,0,-0.7071],
// 3 16 0 0 0 -0.7071 0 -0.7071 -0.3827 0 -0.9239
  [3,16,0,0,0,-0.7071,0,-0.7071,-0.3827,0,-0.9239],
// 3 16 0 0 0 -0.3827 0 -0.9239 0 0 -1
  [3,16,0,0,0,-0.3827,0,-0.9239,0,0,-1],
// 3 16 0 0 0 0 0 -1 0.3827 0 -0.9239
  [3,16,0,0,0,0,0,-1,0.3827,0,-0.9239],
// 3 16 0 0 0 0.3827 0 -0.9239 0.7071 0 -0.7071
  [3,16,0,0,0,0.3827,0,-0.9239,0.7071,0,-0.7071],
// 3 16 0 0 0 0.7071 0 -0.7071 0.9239 0 -0.3827
  [3,16,0,0,0,0.7071,0,-0.7071,0.9239,0,-0.3827],
// 3 16 0 0 0 0.9239 0 -0.3827 1 0 0
  [3,16,0,0,0,0.9239,0,-0.3827,1,0,0],
// 0
];
module ldraw_lib__4_4disc(step=0, col=false, unit=2/5, alt=false, line=0.2, solid=!$preview)
    makepoly(ldraw_lib__4_4disc(), step=step, col=col, unit=unit, alt=alt, line=line, solid=solid);
ldraw_lib__4_4disc(line=0.2);
// file: ../p/4-4cyli.scad
use <../lib.scad>
function ldraw_lib__4_4cyli() = [
// 0 Cylinder 1.0
// 0 Name: 4-4cyli.dat
// 0 Author: James Jessiman
// 0 !LDRAW_ORG Primitive UPDATE 2005-01
// 0 !LICENSE Licensed under CC BY 2.0 and CC BY 4.0 : see CAreadme.txt
// 
// 0 BFC CERTIFY CCW
  [0,"BFC","CERTIFY"],
  [0,"BFC","CCW"],
// 
// 0 !HISTORY 1998-12-15 [PTadmin] Official Update 1998-10
// 0 !HISTORY 2002-03-23 [sbliss] Added BFC statement; merged headers from files in distributions LDraw 0.27 and Complete.
// 0 !HISTORY 2002-04-25 [PTadmin] Official Update 2002-02
// 0 !HISTORY 2004-12-14 [guyvivan] BFC CCW
// 0 !HISTORY 2005-12-28 [PTadmin] Official Update 2005-01
// 0 !HISTORY 2007-06-24 [PTadmin] Header formatted for Contributor Agreement
// 0 !HISTORY 2008-07-01 [PTadmin] Official Update 2008-01
// 
// 
// 4 16 1 1 0 0.9239 1 0.3827 0.9239 0 0.3827 1 0 0
  [4,16,1,1,0,0.9239,1,0.3827,0.9239,0,0.3827,1,0,0],
// 5 24 1 0 0 1 1 0 0.9239 0 0.3827 0.9239 0 -0.3827
  [5,24,1,0,0,1,1,0,0.9239,0,0.3827,0.9239,0,-0.3827],
// 4 16 0.9239 1 0.3827 0.7071 1 0.7071 0.7071 0 0.7071 0.9239 0 0.3827
  [4,16,0.9239,1,0.3827,0.7071,1,0.7071,0.7071,0,0.7071,0.9239,0,0.3827],
// 5 24 0.9239 0 0.3827 0.9239 1 0.3827 0.7071 0 0.7071 1 0 0
  [5,24,0.9239,0,0.3827,0.9239,1,0.3827,0.7071,0,0.7071,1,0,0],
// 4 16 0.7071 1 0.7071 0.3827 1 0.9239 0.3827 0 0.9239 0.7071 0 0.7071
  [4,16,0.7071,1,0.7071,0.3827,1,0.9239,0.3827,0,0.9239,0.7071,0,0.7071],
// 5 24 0.7071 0 0.7071 0.7071 1 0.7071 0.3827 0 0.9239 0.9239 0 0.3827
  [5,24,0.7071,0,0.7071,0.7071,1,0.7071,0.3827,0,0.9239,0.9239,0,0.3827],
// 4 16 0.3827 1 0.9239 0 1 1 0 0 1 0.3827 0 0.9239
  [4,16,0.3827,1,0.9239,0,1,1,0,0,1,0.3827,0,0.9239],
// 5 24 0.3827 0 0.9239 0.3827 1 0.9239 0 0 1 0.7071 0 0.7071
  [5,24,0.3827,0,0.9239,0.3827,1,0.9239,0,0,1,0.7071,0,0.7071],
// 4 16 0 1 1 -0.3827 1 0.9239 -0.3827 0 0.9239 0 0 1
  [4,16,0,1,1,-0.3827,1,0.9239,-0.3827,0,0.9239,0,0,1],
// 5 24 0 0 1 0 1 1 -0.3827 0 0.9239 0.3827 0 0.9239
  [5,24,0,0,1,0,1,1,-0.3827,0,0.9239,0.3827,0,0.9239],
// 4 16 -0.3827 1 0.9239 -0.7071 1 0.7071 -0.7071 0 0.7071 -0.3827 0 0.9239
  [4,16,-0.3827,1,0.9239,-0.7071,1,0.7071,-0.7071,0,0.7071,-0.3827,0,0.9239],
// 5 24 -0.3827 0 0.9239 -0.3827 1 0.9239 -0.7071 0 0.7071 0 0 1
  [5,24,-0.3827,0,0.9239,-0.3827,1,0.9239,-0.7071,0,0.7071,0,0,1],
// 4 16 -0.7071 1 0.7071 -0.9239 1 0.3827 -0.9239 0 0.3827 -0.7071 0 0.7071
  [4,16,-0.7071,1,0.7071,-0.9239,1,0.3827,-0.9239,0,0.3827,-0.7071,0,0.7071],
// 5 24 -0.7071 0 0.7071 -0.7071 1 0.7071 -0.9239 0 0.3827 -0.3827 0 0.9239
  [5,24,-0.7071,0,0.7071,-0.7071,1,0.7071,-0.9239,0,0.3827,-0.3827,0,0.9239],
// 4 16 -0.9239 1 0.3827 -1 1 0 -1 0 0 -0.9239 0 0.3827
  [4,16,-0.9239,1,0.3827,-1,1,0,-1,0,0,-0.9239,0,0.3827],
// 5 24 -0.9239 0 0.3827 -0.9239 1 0.3827 -1 0 0 -0.7071 0 0.7071
  [5,24,-0.9239,0,0.3827,-0.9239,1,0.3827,-1,0,0,-0.7071,0,0.7071],
// 4 16 -1 1 0 -0.9239 1 -0.3827 -0.9239 0 -0.3827 -1 0 0
  [4,16,-1,1,0,-0.9239,1,-0.3827,-0.9239,0,-0.3827,-1,0,0],
// 5 24 -1 0 0 -1 1 0 -0.9239 0 -0.3827 -0.9239 0 0.3827
  [5,24,-1,0,0,-1,1,0,-0.9239,0,-0.3827,-0.9239,0,0.3827],
// 4 16 -0.9239 1 -0.3827 -0.7071 1 -0.7071 -0.7071 0 -0.7071 -0.9239 0 -0.3827
  [4,16,-0.9239,1,-0.3827,-0.7071,1,-0.7071,-0.7071,0,-0.7071,-0.9239,0,-0.3827],
// 5 24 -0.9239 0 -0.3827 -0.9239 1 -0.3827 -0.7071 0 -0.7071 -1 0 0
  [5,24,-0.9239,0,-0.3827,-0.9239,1,-0.3827,-0.7071,0,-0.7071,-1,0,0],
// 4 16 -0.7071 1 -0.7071 -0.3827 1 -0.9239 -0.3827 0 -0.9239 -0.7071 0 -0.7071
  [4,16,-0.7071,1,-0.7071,-0.3827,1,-0.9239,-0.3827,0,-0.9239,-0.7071,0,-0.7071],
// 5 24 -0.7071 0 -0.7071 -0.7071 1 -0.7071 -0.3827 0 -0.9239 -0.9239 0 -0.3827
  [5,24,-0.7071,0,-0.7071,-0.7071,1,-0.7071,-0.3827,0,-0.9239,-0.9239,0,-0.3827],
// 4 16 -0.3827 1 -0.9239 0 1 -1 0 0 -1 -0.3827 0 -0.9239
  [4,16,-0.3827,1,-0.9239,0,1,-1,0,0,-1,-0.3827,0,-0.9239],
// 5 24 -0.3827 0 -0.9239 -0.3827 1 -0.9239 0 0 -1 -0.7071 0 -0.7071
  [5,24,-0.3827,0,-0.9239,-0.3827,1,-0.9239,0,0,-1,-0.7071,0,-0.7071],
// 4 16 0 1 -1 0.3827 1 -0.9239 0.3827 0 -0.9239 0 0 -1
  [4,16,0,1,-1,0.3827,1,-0.9239,0.3827,0,-0.9239,0,0,-1],
// 5 24 0 0 -1 0 1 -1 0.3827 0 -0.9239 -0.3827 0 -0.9239
  [5,24,0,0,-1,0,1,-1,0.3827,0,-0.9239,-0.3827,0,-0.9239],
// 4 16 0.3827 1 -0.9239 0.7071 1 -0.7071 0.7071 0 -0.7071 0.3827 0 -0.9239
  [4,16,0.3827,1,-0.9239,0.7071,1,-0.7071,0.7071,0,-0.7071,0.3827,0,-0.9239],
// 5 24 0.3827 0 -0.9239 0.3827 1 -0.9239 0.7071 0 -0.7071 0 0 -1
  [5,24,0.3827,0,-0.9239,0.3827,1,-0.9239,0.7071,0,-0.7071,0,0,-1],
// 4 16 0.7071 1 -0.7071 0.9239 1 -0.3827 0.9239 0 -0.3827 0.7071 0 -0.7071
  [4,16,0.7071,1,-0.7071,0.9239,1,-0.3827,0.9239,0,-0.3827,0.7071,0,-0.7071],
// 5 24 0.7071 0 -0.7071 0.7071 1 -0.7071 0.9239 0 -0.3827 0.3827 0 -0.9239
  [5,24,0.7071,0,-0.7071,0.7071,1,-0.7071,0.9239,0,-0.3827,0.3827,0,-0.9239],
// 4 16 0.9239 1 -0.3827 1 1 0 1 0 0 0.9239 0 -0.3827
  [4,16,0.9239,1,-0.3827,1,1,0,1,0,0,0.9239,0,-0.3827],
// 5 24 0.9239 0 -0.3827 0.9239 1 -0.3827 1 0 0 0.7071 0 -0.7071
  [5,24,0.9239,0,-0.3827,0.9239,1,-0.3827,1,0,0,0.7071,0,-0.7071],
// 0
];
module ldraw_lib__4_4cyli(step=0, col=false, unit=2/5, alt=false, line=0.2, solid=!$preview)
    makepoly(ldraw_lib__4_4cyli(), step=step, col=col, unit=unit, alt=alt, line=line, solid=solid);
ldraw_lib__4_4cyli(line=0.2);
// main file
use <../lib.scad>
use <../p/4-4cyli.scad>
use <../p/4-4disc.scad>
use <../p/4-4edge.scad>
use <../p/4-4ring4.scad>
use <../p/4-4ring5.scad>
use <../p/4-4ring6.scad>
use <../p/4-4ring7.scad>
use <../p/axle.scad>
function ldraw_lib__u9010() = [
// 0 ~Technic Axle Flexible 26 Axle - 4L End
// 0 Name: u9010.dat
// 0 Author: Michael Heidemann [mikeheide]
// 0 !LDRAW_ORG Part UPDATE 2010-03
// 0 !LICENSE Licensed under CC BY 2.0 and CC BY 4.0 : see CAreadme.txt
// 
// 0 BFC CERTIFY CCW
  [0,"BFC","CERTIFY"],
  [0,"BFC","CCW"],
// 
// 0 !HISTORY 2010-12-31 [PTadmin] Official Update 2010-03
// 
// 
// 0 BFC INVERTNEXT
  [0,"BFC","INVERTNEXT"],
// 1 16 0 0 0 0 10 0 -3.5 0 0 0 0 3.5 4-4cyli.dat
  [1,16,0,0,0,0,10,0,-3.5,0,0,0,0,3.5, ldraw_lib__4_4cyli()],
// 1 16 0 0 0 0 1 0 -1 0 0 0 0 1 4-4ring5.dat
  [1,16,0,0,0,0,1,0,-1,0,0,0,0,1, ldraw_lib__4_4ring5()],
// 1 16 0 0 0 0 1 0 -1 0 0 0 0 1 4-4ring4.dat
  [1,16,0,0,0,0,1,0,-1,0,0,0,0,1, ldraw_lib__4_4ring4()],
// 1 16 0 0 0 0 1 0 -0.5 0 0 0 0 0.5 4-4ring7.dat
  [1,16,0,0,0,0,1,0,-0.5,0,0,0,0,0.5, ldraw_lib__4_4ring7()],
// 1 16 10 0 0 0 1 0 -3.5 0 0 0 0 3.5 4-4disc.dat
  [1,16,10,0,0,0,1,0,-3.5,0,0,0,0,3.5, ldraw_lib__4_4disc()],
// 1 16 15 0 0 0 1 0 -1 0 0 0 0 1 4-4ring6.dat
  [1,16,15,0,0,0,1,0,-1,0,0,0,0,1, ldraw_lib__4_4ring6()],
// 1 16 0 0 0 0 15 0 -6 0 0 0 0 6 4-4cyli.dat
  [1,16,0,0,0,0,15,0,-6,0,0,0,0,6, ldraw_lib__4_4cyli()],
// 1 16 15 0 0 0 5 0 -7 0 0 0 0 7 4-4cyli.dat
  [1,16,15,0,0,0,5,0,-7,0,0,0,0,7, ldraw_lib__4_4cyli()],
// 1 16 15 0 0 0 15 0 -7 0 0 0 0 7 4-4edge.dat
  [1,16,15,0,0,0,15,0,-7,0,0,0,0,7, ldraw_lib__4_4edge()],
// 1 16 20 0 0 0 15 0 -7 0 0 0 0 7 4-4edge.dat
  [1,16,20,0,0,0,15,0,-7,0,0,0,0,7, ldraw_lib__4_4edge()],
// 1 16 20 0 0 0 -15 0 -7 0 0 0 0 -7 4-4disc.dat
  [1,16,20,0,0,0,-15,0,-7,0,0,0,0,-7, ldraw_lib__4_4disc()],
// 1 16 0 0 0 0 15 0 -6 0 0 0 0 6 4-4edge.dat
  [1,16,0,0,0,0,15,0,-6,0,0,0,0,6, ldraw_lib__4_4edge()],
// 1 16 15 0 0 0 15 0 -6 0 0 0 0 6 4-4edge.dat
  [1,16,15,0,0,0,15,0,-6,0,0,0,0,6, ldraw_lib__4_4edge()],
// 1 16 0 0 0 0 15 0 -3.5 0 0 0 0 3.5 4-4edge.dat
  [1,16,0,0,0,0,15,0,-3.5,0,0,0,0,3.5, ldraw_lib__4_4edge()],
// 1 16 10 0 0 0 15 0 -3.5 0 0 0 0 3.5 4-4edge.dat
  [1,16,10,0,0,0,15,0,-3.5,0,0,0,0,3.5, ldraw_lib__4_4edge()],
// 1 16 20 0 0 0 90 0 -1 0 0 0 0 1 axle.dat
  [1,16,20,0,0,0,90,0,-1,0,0,0,0,1, ldraw_lib__axle()],
// 0
];
module ldraw_lib__u9010(step=0, col=false, unit=2/5, alt=false, line=0.2, solid=!$preview)
    makepoly(ldraw_lib__u9010(), step=step, col=col, unit=unit, alt=alt, line=line, solid=solid);
ldraw_lib__u9010(line=0.2);
